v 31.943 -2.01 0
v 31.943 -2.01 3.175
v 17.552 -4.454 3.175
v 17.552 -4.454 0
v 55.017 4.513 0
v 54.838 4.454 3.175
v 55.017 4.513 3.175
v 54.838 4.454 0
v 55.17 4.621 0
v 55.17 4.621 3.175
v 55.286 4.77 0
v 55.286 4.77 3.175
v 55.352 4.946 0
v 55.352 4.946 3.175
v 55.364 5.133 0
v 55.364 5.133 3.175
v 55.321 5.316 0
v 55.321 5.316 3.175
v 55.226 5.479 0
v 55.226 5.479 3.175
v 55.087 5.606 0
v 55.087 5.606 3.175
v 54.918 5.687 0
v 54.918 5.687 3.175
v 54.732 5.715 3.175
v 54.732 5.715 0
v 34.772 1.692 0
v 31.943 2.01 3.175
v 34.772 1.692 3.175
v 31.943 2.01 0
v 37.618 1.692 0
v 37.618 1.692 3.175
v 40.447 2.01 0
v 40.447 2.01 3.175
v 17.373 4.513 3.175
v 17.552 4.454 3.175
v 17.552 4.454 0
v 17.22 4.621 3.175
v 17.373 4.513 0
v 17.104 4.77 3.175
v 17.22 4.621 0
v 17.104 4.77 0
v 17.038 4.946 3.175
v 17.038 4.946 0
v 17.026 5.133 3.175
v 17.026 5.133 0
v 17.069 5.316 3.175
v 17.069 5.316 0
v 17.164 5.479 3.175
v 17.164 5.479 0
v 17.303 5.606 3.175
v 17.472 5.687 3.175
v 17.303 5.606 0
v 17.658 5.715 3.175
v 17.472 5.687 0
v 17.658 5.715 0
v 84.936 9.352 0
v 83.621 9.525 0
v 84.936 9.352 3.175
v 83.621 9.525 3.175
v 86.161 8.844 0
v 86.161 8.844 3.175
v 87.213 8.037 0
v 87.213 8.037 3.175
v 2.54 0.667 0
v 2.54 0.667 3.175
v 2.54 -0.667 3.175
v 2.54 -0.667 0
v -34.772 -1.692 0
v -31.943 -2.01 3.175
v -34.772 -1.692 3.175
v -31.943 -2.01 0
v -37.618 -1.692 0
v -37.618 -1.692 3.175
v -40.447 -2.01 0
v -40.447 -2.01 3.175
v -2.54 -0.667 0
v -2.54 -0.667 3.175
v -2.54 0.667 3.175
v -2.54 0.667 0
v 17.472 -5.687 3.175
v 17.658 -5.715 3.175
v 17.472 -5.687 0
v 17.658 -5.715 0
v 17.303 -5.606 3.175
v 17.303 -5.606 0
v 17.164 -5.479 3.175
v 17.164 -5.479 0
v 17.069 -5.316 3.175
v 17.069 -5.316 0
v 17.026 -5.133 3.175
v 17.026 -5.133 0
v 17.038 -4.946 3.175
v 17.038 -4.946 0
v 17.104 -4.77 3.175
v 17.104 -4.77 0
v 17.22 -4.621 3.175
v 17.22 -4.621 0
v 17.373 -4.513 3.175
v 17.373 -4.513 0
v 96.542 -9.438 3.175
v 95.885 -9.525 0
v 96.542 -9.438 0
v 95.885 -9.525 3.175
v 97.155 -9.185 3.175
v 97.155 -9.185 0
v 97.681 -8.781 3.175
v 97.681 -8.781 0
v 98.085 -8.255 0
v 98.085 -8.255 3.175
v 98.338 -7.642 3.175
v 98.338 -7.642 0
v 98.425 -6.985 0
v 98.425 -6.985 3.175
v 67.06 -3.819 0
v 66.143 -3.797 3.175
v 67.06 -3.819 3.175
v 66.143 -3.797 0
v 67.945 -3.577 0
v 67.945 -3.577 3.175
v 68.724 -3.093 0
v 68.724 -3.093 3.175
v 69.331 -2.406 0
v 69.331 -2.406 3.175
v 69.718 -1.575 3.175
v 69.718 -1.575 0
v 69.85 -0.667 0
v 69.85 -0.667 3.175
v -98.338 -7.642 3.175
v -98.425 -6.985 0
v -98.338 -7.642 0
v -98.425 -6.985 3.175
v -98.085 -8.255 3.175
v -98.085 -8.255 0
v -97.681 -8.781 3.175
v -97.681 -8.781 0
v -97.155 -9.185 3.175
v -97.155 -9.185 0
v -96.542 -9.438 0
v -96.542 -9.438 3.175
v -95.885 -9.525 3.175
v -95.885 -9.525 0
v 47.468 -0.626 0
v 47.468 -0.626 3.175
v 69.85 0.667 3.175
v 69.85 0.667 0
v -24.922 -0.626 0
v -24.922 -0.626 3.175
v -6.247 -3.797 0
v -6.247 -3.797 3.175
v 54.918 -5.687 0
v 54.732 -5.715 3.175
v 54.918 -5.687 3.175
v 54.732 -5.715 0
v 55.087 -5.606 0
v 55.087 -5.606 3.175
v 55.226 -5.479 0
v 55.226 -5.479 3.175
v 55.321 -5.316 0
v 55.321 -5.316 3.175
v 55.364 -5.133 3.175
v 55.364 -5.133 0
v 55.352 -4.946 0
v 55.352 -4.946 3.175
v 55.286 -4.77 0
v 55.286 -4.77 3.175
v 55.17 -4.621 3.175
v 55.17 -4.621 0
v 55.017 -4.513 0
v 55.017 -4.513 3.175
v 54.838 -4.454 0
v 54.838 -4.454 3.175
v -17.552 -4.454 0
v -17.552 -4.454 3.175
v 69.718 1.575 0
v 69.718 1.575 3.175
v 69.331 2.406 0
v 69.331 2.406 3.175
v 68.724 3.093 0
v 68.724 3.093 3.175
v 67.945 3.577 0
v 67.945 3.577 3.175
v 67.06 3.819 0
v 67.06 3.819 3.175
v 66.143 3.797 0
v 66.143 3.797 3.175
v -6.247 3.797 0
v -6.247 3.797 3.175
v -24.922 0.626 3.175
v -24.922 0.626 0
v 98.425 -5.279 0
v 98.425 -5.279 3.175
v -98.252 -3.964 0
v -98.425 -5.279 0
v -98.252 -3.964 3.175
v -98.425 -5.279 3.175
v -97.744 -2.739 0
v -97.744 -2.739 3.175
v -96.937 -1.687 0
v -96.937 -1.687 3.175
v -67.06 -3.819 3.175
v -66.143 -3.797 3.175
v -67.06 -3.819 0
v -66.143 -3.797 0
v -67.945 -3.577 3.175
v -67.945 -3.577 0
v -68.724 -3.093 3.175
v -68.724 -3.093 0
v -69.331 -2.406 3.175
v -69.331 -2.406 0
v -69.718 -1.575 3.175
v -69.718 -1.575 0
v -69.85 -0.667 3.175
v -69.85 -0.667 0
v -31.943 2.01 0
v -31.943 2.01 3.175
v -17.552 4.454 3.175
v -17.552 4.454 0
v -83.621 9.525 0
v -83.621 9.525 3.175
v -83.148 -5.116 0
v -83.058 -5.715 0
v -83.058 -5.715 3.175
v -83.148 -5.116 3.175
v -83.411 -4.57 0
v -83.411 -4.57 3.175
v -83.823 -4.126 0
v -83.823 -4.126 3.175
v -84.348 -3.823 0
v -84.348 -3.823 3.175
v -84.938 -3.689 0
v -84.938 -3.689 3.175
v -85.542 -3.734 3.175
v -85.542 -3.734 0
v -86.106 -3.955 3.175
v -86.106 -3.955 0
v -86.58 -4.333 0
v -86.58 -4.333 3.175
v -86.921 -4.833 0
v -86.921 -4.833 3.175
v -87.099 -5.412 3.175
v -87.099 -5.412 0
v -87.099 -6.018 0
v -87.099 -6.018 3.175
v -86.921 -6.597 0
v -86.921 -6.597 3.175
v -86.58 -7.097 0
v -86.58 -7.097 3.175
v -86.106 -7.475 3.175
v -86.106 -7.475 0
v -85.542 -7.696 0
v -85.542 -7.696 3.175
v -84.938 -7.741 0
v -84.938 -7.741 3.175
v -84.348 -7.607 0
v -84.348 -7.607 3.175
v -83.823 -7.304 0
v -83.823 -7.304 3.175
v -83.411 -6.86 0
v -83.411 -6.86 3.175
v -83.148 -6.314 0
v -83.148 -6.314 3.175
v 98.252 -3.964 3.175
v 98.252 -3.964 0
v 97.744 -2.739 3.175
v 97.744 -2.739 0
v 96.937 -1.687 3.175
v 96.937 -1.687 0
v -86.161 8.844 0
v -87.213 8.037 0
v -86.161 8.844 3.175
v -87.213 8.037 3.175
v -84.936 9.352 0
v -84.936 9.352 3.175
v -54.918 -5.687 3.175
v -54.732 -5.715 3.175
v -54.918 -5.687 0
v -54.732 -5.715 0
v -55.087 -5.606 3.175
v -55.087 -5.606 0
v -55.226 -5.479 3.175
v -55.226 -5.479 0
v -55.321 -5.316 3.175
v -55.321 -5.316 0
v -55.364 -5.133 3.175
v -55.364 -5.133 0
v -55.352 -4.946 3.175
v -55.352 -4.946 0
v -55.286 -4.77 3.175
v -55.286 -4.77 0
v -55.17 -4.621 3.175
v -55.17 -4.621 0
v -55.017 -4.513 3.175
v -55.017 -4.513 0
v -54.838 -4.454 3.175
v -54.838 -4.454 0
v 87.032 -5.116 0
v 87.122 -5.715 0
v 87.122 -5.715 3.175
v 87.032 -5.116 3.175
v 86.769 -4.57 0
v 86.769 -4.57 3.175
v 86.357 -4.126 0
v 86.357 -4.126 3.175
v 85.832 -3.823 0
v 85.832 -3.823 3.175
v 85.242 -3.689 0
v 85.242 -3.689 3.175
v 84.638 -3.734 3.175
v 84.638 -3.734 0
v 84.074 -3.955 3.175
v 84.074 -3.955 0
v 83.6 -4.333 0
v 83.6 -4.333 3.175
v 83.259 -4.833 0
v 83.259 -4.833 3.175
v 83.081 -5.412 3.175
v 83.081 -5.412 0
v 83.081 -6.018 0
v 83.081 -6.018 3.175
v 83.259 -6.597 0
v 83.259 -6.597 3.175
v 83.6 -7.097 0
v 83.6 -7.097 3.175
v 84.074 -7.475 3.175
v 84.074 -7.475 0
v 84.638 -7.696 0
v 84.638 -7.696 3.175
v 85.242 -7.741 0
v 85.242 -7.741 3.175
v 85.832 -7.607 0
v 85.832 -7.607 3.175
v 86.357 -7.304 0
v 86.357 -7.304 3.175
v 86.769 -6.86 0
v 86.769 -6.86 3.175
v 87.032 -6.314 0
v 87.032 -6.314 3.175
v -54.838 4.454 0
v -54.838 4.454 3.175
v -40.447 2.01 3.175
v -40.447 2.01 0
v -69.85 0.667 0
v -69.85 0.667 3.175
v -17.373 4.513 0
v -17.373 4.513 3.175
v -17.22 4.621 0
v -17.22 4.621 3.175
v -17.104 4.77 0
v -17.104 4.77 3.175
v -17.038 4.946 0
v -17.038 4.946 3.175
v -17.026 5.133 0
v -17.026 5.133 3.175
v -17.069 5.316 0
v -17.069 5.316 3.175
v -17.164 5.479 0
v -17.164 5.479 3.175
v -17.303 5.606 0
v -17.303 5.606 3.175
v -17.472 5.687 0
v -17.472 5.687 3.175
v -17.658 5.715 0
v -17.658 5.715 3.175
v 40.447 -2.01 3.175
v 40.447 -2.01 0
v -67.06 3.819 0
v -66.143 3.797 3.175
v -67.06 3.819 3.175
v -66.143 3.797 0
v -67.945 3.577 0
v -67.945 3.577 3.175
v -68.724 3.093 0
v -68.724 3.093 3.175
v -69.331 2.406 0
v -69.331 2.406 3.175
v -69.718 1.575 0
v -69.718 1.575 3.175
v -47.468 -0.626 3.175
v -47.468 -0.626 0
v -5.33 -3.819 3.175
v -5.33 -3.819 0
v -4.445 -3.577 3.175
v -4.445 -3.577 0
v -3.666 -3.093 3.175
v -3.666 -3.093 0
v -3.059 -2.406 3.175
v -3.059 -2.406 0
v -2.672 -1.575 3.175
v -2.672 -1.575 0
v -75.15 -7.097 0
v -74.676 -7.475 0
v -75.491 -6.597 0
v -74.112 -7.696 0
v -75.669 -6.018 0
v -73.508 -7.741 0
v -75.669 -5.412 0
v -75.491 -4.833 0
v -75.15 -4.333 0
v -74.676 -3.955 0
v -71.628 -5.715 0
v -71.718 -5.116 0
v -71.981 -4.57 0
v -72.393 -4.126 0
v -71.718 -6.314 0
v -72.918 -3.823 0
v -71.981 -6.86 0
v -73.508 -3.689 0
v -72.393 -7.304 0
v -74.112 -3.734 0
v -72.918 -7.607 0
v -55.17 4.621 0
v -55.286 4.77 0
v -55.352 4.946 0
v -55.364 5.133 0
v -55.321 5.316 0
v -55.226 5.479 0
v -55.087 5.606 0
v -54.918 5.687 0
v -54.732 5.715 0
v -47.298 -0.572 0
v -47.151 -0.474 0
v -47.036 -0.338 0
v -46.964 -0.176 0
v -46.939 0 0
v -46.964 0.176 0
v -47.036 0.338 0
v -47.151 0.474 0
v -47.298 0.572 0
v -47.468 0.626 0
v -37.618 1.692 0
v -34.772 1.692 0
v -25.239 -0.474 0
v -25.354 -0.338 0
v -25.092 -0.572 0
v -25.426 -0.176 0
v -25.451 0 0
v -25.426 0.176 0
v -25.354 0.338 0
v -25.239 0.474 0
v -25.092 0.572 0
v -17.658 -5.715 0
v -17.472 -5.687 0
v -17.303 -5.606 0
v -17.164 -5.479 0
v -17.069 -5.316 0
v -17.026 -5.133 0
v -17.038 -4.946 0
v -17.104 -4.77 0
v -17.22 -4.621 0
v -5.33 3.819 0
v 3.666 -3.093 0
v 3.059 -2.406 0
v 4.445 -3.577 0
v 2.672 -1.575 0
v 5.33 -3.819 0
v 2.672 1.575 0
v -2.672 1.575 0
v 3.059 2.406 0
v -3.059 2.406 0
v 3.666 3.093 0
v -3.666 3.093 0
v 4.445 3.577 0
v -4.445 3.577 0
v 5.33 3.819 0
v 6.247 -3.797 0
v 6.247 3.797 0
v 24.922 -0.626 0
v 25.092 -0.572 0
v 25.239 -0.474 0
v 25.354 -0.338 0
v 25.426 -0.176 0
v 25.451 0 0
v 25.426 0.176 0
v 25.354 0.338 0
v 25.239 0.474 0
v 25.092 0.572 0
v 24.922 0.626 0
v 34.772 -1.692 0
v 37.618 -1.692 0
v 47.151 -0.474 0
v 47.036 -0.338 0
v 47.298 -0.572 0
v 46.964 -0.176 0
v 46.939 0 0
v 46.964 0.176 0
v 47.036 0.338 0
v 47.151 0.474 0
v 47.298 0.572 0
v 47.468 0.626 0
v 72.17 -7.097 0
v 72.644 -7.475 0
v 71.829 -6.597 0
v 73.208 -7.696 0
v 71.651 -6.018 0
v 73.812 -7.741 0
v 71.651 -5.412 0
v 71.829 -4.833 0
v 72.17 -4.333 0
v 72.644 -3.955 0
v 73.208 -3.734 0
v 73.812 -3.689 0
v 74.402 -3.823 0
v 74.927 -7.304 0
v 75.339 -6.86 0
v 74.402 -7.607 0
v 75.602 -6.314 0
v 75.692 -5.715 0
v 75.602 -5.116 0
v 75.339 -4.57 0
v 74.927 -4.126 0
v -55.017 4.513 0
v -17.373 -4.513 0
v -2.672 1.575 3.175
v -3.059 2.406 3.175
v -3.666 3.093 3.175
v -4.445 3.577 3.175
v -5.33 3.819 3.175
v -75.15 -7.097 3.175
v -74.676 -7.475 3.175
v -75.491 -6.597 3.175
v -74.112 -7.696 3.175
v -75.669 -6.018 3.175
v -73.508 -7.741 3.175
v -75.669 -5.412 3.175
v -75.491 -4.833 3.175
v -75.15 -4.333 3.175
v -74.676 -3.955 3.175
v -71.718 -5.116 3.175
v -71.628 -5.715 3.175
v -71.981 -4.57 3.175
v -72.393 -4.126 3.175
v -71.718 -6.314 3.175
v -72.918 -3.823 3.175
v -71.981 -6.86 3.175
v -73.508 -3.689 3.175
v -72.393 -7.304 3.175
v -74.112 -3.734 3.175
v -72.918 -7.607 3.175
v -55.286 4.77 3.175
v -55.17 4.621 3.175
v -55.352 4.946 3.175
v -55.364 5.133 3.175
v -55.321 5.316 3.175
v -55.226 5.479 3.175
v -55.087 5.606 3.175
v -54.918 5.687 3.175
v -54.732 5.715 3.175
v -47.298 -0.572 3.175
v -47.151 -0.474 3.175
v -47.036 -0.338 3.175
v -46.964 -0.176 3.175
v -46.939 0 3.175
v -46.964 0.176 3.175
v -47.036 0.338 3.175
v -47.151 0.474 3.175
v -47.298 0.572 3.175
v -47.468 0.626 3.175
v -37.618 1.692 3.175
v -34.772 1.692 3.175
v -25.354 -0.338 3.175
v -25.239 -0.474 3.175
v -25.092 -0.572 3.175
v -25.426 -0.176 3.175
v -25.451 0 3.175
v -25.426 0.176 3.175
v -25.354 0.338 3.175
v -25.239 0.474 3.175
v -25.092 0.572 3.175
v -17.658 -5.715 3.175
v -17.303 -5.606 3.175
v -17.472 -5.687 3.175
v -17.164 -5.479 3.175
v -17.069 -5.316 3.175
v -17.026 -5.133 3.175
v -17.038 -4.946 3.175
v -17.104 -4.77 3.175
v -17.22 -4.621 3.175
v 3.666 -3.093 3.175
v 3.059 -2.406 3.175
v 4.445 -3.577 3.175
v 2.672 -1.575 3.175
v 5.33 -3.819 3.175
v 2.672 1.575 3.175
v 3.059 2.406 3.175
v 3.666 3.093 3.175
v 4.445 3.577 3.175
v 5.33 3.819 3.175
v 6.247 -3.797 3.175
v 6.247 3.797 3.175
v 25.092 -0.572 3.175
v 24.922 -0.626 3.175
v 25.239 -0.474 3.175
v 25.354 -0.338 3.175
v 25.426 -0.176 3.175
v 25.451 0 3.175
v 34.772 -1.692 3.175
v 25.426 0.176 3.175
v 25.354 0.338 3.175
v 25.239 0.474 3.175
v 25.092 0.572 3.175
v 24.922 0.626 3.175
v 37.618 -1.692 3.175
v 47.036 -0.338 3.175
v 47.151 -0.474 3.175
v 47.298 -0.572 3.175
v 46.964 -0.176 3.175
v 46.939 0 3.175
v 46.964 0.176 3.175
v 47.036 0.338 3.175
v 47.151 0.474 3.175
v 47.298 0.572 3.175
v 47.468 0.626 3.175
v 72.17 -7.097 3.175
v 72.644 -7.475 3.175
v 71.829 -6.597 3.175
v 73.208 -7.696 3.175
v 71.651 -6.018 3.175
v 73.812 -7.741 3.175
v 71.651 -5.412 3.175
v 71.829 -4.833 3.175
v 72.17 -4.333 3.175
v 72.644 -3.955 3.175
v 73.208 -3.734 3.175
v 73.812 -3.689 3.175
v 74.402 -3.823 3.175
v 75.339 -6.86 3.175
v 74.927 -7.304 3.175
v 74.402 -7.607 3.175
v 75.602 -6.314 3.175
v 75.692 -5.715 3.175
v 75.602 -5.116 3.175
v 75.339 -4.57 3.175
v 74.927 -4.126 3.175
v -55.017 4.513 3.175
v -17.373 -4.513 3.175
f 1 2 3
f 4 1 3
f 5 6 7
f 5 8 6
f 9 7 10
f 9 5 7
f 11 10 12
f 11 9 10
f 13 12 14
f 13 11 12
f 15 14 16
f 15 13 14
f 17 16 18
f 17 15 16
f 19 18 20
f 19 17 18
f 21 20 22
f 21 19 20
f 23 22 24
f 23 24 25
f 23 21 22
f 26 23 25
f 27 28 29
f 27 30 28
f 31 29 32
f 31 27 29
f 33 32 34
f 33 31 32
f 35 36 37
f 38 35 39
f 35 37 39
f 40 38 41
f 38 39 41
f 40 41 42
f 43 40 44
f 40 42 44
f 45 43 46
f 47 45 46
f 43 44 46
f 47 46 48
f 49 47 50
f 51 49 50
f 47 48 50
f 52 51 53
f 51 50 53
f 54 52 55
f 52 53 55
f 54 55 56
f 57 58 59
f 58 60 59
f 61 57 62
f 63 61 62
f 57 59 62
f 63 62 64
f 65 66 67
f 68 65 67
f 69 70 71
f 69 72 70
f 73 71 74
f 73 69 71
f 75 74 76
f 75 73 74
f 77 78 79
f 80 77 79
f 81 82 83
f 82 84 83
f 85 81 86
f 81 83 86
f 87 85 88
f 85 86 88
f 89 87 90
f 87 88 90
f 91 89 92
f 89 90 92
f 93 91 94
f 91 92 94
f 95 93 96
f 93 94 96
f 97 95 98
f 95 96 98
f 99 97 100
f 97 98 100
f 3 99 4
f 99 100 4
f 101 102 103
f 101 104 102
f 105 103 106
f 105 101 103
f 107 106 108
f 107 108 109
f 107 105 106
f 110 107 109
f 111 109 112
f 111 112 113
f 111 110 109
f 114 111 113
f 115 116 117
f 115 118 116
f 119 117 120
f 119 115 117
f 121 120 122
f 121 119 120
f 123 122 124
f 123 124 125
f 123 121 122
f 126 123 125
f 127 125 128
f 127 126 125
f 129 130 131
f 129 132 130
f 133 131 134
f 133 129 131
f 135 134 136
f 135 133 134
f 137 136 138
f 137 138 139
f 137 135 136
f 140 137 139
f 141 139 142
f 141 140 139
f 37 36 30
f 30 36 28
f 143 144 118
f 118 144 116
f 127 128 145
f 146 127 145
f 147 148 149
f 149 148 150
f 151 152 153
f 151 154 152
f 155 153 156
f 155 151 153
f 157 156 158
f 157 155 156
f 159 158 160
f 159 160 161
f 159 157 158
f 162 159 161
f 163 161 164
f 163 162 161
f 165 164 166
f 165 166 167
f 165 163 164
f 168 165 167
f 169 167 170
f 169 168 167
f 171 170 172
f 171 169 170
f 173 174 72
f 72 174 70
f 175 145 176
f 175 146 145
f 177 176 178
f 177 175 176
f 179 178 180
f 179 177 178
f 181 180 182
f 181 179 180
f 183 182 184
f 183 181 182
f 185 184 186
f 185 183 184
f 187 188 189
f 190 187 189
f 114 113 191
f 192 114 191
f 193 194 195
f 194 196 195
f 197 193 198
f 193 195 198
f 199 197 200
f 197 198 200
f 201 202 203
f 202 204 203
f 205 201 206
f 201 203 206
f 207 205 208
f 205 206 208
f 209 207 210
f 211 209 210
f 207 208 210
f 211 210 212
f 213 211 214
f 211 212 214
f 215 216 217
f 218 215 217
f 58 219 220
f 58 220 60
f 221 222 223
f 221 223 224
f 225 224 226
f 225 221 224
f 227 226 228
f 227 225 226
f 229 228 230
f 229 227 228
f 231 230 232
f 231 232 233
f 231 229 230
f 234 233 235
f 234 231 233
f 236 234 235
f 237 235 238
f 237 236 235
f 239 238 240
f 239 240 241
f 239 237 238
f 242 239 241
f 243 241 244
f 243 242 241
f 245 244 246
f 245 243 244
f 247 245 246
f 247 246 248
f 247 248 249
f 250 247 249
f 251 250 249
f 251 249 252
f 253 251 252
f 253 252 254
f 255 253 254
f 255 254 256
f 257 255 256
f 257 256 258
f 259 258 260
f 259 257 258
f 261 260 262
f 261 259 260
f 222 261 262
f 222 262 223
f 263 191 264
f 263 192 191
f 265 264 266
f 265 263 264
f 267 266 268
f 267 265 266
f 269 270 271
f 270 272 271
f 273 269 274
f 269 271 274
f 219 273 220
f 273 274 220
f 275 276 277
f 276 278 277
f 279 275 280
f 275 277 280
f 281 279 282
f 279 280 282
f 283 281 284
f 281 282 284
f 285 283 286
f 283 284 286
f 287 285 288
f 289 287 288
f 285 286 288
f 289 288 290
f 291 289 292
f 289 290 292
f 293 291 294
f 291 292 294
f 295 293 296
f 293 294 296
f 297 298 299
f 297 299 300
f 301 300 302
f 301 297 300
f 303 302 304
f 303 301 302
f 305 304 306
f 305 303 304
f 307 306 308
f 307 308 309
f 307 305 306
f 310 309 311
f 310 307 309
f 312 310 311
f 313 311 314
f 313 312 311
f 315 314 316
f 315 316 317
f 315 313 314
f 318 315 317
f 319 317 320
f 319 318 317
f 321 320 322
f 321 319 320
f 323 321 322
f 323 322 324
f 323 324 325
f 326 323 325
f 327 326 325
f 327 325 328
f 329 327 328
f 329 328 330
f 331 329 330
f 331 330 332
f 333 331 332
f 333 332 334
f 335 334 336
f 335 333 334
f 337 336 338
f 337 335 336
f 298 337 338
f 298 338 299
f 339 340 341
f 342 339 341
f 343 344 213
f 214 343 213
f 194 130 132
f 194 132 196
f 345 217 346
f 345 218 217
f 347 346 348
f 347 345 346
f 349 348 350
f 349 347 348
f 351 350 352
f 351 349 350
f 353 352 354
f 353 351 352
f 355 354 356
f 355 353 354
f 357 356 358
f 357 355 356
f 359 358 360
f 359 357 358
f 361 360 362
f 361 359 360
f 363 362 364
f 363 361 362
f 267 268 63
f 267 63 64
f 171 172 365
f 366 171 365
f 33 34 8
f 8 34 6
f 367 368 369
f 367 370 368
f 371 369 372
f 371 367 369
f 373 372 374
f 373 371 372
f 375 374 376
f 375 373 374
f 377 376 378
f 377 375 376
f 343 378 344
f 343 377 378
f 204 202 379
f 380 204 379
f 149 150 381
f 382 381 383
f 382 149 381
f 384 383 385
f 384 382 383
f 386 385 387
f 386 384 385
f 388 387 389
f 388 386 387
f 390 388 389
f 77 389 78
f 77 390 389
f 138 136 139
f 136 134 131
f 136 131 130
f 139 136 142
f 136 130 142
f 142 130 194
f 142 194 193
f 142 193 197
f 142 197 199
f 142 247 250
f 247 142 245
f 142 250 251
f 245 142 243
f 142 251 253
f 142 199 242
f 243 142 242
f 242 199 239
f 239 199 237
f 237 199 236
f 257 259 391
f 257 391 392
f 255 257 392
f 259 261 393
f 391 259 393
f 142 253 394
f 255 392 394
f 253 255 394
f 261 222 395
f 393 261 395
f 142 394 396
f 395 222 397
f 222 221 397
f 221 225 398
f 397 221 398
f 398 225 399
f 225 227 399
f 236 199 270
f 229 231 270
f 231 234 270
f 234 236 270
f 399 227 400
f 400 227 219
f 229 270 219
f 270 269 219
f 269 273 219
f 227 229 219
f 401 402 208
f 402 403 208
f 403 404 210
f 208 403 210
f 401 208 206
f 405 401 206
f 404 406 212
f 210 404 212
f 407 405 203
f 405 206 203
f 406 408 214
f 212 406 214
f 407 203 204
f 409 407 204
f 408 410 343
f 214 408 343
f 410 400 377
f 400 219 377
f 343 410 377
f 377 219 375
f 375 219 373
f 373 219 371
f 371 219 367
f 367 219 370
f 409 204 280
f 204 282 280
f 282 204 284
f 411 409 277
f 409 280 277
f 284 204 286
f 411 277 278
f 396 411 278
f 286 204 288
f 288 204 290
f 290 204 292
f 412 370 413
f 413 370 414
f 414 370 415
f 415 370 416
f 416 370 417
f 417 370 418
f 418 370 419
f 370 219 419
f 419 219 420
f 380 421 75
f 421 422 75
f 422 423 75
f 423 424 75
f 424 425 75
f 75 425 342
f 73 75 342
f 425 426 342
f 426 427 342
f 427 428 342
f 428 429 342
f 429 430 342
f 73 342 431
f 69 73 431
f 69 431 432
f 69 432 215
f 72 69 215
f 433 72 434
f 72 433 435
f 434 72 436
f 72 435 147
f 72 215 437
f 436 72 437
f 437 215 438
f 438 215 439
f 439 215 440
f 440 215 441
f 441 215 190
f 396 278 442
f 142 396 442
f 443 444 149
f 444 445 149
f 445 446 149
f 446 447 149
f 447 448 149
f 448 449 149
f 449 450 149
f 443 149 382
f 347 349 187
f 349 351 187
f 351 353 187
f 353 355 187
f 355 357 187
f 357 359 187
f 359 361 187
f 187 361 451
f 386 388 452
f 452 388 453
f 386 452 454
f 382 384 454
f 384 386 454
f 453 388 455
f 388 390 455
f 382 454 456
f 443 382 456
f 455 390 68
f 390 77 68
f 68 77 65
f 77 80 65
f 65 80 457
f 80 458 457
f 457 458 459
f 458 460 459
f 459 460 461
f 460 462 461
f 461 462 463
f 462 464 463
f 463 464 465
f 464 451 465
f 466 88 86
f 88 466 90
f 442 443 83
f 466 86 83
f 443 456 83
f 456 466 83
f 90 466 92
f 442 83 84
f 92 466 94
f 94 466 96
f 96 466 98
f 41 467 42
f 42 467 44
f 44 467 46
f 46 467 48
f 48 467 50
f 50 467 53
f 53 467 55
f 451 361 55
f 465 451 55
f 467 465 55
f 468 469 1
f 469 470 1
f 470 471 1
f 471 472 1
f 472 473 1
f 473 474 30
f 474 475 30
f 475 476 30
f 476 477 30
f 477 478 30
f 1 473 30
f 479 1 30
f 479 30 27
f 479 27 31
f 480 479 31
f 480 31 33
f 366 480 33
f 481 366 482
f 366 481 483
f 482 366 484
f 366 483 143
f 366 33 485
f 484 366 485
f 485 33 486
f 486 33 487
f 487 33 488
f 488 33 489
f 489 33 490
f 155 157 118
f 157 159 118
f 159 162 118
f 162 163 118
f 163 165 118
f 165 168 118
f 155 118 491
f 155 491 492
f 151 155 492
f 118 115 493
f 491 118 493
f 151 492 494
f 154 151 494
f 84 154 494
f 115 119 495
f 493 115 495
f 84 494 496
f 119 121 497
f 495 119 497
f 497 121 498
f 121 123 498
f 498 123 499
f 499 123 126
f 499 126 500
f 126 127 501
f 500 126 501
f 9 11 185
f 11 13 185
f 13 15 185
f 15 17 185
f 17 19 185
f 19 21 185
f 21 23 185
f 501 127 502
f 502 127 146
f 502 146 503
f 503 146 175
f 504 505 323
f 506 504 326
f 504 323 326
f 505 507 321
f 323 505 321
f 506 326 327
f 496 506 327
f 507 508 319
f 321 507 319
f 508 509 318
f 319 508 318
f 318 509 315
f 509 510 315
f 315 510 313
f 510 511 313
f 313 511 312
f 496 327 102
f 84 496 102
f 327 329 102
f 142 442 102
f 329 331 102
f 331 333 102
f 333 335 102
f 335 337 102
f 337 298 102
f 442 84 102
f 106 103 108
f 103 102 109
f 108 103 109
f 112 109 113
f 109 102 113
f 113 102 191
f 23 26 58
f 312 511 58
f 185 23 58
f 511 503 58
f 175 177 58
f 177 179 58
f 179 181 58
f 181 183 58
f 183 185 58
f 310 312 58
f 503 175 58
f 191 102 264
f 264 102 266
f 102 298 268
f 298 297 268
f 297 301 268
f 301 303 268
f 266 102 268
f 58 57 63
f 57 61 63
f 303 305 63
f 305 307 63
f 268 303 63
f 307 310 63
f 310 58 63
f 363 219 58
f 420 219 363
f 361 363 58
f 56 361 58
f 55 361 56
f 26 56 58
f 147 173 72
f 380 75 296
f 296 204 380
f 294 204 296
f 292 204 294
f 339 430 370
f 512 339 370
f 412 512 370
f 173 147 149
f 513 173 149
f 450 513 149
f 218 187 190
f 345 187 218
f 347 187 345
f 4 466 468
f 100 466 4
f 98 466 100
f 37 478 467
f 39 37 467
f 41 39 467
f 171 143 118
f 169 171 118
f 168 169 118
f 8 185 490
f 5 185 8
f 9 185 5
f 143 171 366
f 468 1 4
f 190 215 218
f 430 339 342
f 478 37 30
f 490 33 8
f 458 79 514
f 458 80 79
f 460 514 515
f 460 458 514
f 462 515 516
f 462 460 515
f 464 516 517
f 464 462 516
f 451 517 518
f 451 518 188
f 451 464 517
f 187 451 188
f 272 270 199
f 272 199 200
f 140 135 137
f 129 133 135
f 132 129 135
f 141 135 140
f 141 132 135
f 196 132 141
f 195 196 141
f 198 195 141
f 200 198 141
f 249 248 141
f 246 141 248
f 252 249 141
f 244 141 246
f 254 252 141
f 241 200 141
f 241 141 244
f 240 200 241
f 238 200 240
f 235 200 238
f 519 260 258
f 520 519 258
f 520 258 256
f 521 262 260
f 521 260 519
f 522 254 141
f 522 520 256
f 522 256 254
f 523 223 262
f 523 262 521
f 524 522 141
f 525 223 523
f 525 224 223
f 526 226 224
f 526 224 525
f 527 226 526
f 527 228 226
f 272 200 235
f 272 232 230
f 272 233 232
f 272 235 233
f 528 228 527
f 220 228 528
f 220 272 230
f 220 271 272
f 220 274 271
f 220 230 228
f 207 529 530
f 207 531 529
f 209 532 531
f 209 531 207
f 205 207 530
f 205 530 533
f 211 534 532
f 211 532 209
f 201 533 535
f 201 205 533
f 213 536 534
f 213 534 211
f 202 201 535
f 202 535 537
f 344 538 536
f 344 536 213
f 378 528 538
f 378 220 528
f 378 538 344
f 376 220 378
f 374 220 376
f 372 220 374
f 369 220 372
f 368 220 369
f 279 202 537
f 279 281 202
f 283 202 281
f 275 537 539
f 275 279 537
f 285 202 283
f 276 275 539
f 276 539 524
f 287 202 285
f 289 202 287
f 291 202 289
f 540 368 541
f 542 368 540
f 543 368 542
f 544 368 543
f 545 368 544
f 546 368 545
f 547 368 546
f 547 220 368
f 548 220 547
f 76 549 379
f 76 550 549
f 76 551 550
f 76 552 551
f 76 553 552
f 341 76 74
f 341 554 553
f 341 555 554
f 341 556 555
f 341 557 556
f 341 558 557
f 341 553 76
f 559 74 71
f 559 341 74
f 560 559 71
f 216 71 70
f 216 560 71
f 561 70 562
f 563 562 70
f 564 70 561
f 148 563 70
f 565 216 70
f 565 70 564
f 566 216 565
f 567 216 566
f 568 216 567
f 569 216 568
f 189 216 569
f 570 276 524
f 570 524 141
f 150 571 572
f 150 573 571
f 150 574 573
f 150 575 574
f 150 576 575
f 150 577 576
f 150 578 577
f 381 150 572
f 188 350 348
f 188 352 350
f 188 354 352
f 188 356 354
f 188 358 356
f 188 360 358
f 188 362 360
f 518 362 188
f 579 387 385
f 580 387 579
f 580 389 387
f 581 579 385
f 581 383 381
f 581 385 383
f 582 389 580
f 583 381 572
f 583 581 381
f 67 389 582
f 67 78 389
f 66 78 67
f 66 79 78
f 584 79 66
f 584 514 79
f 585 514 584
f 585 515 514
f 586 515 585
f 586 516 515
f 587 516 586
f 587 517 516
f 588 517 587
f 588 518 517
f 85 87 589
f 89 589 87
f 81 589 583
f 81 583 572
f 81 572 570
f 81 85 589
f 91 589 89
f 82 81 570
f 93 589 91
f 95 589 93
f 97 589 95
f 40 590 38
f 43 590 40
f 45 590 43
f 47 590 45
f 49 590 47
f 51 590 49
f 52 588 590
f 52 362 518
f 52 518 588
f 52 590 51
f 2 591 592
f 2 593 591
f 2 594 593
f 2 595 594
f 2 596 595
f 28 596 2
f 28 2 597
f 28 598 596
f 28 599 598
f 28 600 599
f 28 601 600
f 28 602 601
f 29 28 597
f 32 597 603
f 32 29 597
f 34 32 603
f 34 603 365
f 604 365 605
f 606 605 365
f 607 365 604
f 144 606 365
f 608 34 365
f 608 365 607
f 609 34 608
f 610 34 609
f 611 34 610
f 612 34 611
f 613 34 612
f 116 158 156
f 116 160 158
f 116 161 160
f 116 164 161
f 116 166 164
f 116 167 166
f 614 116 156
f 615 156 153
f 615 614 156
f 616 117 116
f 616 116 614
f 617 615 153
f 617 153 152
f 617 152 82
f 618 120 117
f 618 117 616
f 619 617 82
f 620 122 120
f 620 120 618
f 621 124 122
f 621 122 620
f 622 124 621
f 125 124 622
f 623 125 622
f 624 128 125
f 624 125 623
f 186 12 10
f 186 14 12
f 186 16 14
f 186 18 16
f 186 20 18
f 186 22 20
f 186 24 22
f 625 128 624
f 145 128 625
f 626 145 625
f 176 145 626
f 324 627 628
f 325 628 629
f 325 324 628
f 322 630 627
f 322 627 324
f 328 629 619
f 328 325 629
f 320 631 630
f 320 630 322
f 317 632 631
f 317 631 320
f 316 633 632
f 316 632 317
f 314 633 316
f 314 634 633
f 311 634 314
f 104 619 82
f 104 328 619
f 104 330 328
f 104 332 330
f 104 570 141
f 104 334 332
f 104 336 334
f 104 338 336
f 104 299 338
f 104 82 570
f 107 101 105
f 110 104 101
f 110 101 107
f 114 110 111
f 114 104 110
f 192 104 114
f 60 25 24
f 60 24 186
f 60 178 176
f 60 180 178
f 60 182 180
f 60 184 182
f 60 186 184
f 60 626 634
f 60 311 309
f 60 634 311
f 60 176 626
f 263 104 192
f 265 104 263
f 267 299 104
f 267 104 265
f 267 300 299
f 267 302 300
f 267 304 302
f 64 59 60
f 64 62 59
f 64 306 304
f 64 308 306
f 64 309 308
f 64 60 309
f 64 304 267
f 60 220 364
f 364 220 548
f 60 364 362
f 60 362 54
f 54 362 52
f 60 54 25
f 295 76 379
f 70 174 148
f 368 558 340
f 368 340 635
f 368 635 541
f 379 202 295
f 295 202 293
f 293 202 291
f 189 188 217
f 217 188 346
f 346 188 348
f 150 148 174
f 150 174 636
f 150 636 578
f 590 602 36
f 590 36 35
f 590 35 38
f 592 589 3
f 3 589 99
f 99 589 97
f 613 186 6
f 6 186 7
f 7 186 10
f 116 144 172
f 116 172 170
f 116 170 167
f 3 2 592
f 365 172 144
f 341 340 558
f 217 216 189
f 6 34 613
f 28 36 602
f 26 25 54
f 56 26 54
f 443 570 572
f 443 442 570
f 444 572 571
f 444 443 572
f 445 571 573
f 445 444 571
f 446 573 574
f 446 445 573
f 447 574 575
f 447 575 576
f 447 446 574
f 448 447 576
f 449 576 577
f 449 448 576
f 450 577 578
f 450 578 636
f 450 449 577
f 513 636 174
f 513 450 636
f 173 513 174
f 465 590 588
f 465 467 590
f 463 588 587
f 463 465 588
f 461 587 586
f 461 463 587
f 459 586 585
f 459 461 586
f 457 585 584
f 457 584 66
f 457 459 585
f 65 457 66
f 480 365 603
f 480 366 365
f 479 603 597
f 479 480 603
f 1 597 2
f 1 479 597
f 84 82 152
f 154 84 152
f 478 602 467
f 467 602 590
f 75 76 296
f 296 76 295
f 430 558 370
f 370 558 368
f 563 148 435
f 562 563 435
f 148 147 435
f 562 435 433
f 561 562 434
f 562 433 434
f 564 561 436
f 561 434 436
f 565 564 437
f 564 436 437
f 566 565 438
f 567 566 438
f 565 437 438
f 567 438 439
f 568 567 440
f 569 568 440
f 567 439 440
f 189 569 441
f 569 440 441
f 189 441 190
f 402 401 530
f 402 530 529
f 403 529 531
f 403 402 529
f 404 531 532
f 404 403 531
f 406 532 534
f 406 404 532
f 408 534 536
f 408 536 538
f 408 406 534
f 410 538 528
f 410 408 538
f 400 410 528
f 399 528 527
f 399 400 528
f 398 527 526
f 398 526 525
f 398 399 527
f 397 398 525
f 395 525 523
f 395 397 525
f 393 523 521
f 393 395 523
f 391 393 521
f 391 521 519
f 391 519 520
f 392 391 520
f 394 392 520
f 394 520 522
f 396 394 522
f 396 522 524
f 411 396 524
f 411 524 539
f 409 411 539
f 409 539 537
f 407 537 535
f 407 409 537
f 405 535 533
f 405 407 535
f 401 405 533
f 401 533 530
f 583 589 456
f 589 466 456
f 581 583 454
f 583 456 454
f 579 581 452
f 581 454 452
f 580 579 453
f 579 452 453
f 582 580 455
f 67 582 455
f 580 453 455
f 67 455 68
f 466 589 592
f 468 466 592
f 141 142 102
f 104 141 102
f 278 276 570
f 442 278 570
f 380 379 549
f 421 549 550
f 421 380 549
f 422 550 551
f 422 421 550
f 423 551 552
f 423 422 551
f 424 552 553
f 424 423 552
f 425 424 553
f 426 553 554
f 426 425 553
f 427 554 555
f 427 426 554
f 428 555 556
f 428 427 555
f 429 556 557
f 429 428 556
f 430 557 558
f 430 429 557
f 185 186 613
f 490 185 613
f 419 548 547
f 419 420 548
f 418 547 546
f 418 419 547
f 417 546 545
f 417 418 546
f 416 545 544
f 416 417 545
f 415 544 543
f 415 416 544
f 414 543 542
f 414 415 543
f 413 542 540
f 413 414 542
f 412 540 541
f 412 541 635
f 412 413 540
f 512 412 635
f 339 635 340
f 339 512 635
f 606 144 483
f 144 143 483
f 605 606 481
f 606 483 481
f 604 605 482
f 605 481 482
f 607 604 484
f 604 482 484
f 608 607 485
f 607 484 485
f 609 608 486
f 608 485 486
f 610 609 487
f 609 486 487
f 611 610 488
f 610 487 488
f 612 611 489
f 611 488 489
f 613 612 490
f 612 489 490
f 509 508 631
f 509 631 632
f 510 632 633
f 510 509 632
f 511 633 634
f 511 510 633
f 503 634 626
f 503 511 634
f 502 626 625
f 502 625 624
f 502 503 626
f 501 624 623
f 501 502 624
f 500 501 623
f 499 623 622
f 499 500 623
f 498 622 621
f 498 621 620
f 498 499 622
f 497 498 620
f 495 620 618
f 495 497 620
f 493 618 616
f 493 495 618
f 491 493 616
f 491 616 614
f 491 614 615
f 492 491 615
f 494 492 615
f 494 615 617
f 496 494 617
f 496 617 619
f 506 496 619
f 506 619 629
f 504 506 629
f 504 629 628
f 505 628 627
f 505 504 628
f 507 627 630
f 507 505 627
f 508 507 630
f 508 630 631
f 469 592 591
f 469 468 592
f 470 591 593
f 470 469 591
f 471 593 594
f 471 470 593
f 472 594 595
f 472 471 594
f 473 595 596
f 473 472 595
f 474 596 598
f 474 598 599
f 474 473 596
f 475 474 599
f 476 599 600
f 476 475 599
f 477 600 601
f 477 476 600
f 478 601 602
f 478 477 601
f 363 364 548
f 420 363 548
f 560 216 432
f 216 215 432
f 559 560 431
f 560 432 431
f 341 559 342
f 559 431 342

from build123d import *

# Parameters (mm, degrees)
SKETCH1_W           = 196.85
SKETCH1_H           = 19.05
SKETCH1_R           = 2.032
BOSS_EXTRUDE1_DEPTH = 3.175
CHAMFER1_SIZE       = 12.7
FILLET1_R           = 5.08
FILLET2_R           = 2.54
CUT_EXTRUDE1_REACH  = 100.936
FILLET3_R           = 3.175
FILLET4_R           = 0.635
FILLET5_R           = 25.4


with BuildPart() as part:
    # Sketch1 → Boss-Extrude1 (new body)
    with BuildSketch(Plane.XY):
        Rectangle(SKETCH1_W, SKETCH1_H)
        with Locations((-73.66, -5.715)):
            Circle(SKETCH1_R, mode=Mode.SUBTRACT)
        with Locations((-85.09, -5.715)):
            Circle(SKETCH1_R, mode=Mode.SUBTRACT)
        with Locations((73.66, -5.715)):
            Circle(SKETCH1_R, mode=Mode.SUBTRACT)
        with Locations((85.09, -5.715)):
            Circle(SKETCH1_R, mode=Mode.SUBTRACT)
    extrude(amount=BOSS_EXTRUDE1_DEPTH)

    # Chamfer1
    chamfer1_edges = [part.edges().sort_by_distance(p)[0] for p in [
        (-98.425, 9.525, 1.5875),
        (98.425, 9.525, 1.5875),
    ]]
    chamfer(chamfer1_edges, length=CHAMFER1_SIZE)

    # Fillet1
    fillet1_edges = [part.edges().sort_by_distance(p)[0] for p in [
        (-85.725, 9.525, 1.5875),
        (85.725, 9.525, 1.5875),
        (98.425, -3.175, 1.5875),
        (-98.425, -3.175, 1.5875),
    ]]
    fillet(fillet1_edges, radius=FILLET1_R)

    # Fillet2
    fillet2_edges = [part.edges().sort_by_distance(p)[0] for p in [
        (98.425, -9.525, 1.5875),
        (-98.425, -9.525, 1.5875),
    ]]
    fillet(fillet2_edges, radius=FILLET2_R)

    # Sketch2 → Cut-Extrude1 (cut, up to next)
    with BuildSketch(Plane.XY.offset(3.175), mode=Mode.PRIVATE) as cut_extrude1_sk1:
        Polygon((-62.264047257, 5.715), (-36.195, 1.288180654), (-10.125952743, 5.715), align=None)
    cut_extrude1_tool1 = extrude(cut_extrude1_sk1.sketch, amount=-CUT_EXTRUDE1_REACH, mode=Mode.PRIVATE) & part.part
    # Sketch2 → Cut-Extrude1 (cut, up to next)
    with BuildSketch(Plane.XY.offset(3.175), mode=Mode.PRIVATE) as cut_extrude1_sk2:
        Polygon((-69.85, 4.426819346), (-69.85, -4.426819346), (-43.780952743, 0), align=None)
    cut_extrude1_tool2 = extrude(cut_extrude1_sk2.sketch, amount=-CUT_EXTRUDE1_REACH, mode=Mode.PRIVATE) & part.part
    # Sketch2 → Cut-Extrude1 (cut, up to next)
    with BuildSketch(Plane.XY.offset(3.175), mode=Mode.PRIVATE) as cut_extrude1_sk3:
        Polygon((-36.195, -1.288180654), (-62.264047257, -5.715), (-10.125952743, -5.715), align=None)
    cut_extrude1_tool3 = extrude(cut_extrude1_sk3.sketch, amount=-CUT_EXTRUDE1_REACH, mode=Mode.PRIVATE) & part.part
    # Sketch2 → Cut-Extrude1 (cut, up to next)
    with BuildSketch(Plane.XY.offset(3.175), mode=Mode.PRIVATE) as cut_extrude1_sk4:
        Polygon((-2.54, 4.426819346), (-28.609047257, 0), (-2.54, -4.426819346), align=None)
    cut_extrude1_tool4 = extrude(cut_extrude1_sk4.sketch, amount=-CUT_EXTRUDE1_REACH, mode=Mode.PRIVATE) & part.part
    # Sketch2 → Cut-Extrude1 (cut, up to next)
    with BuildSketch(Plane.XY.offset(3.175), mode=Mode.PRIVATE) as cut_extrude1_sk5:
        Polygon((2.54, 4.426819346), (2.54, -4.426819346), (28.609047257, 0), align=None)
    cut_extrude1_tool5 = extrude(cut_extrude1_sk5.sketch, amount=-CUT_EXTRUDE1_REACH, mode=Mode.PRIVATE) & part.part
    # Sketch2 → Cut-Extrude1 (cut, up to next)
    with BuildSketch(Plane.XY.offset(3.175), mode=Mode.PRIVATE) as cut_extrude1_sk6:
        Polygon((62.264047257, 5.715), (10.125952743, 5.715), (36.195, 1.288180654), align=None)
    cut_extrude1_tool6 = extrude(cut_extrude1_sk6.sketch, amount=-CUT_EXTRUDE1_REACH, mode=Mode.PRIVATE) & part.part
    # Sketch2 → Cut-Extrude1 (cut, up to next)
    with BuildSketch(Plane.XY.offset(3.175), mode=Mode.PRIVATE) as cut_extrude1_sk7:
        Polygon((69.85, 4.426819346), (43.780952743, 0), (69.85, -4.426819346), align=None)
    cut_extrude1_tool7 = extrude(cut_extrude1_sk7.sketch, amount=-CUT_EXTRUDE1_REACH, mode=Mode.PRIVATE) & part.part
    # Sketch2 → Cut-Extrude1 (cut, up to next)
    with BuildSketch(Plane.XY.offset(3.175), mode=Mode.PRIVATE) as cut_extrude1_sk8:
        Polygon((36.195, -1.288180654), (10.125952743, -5.715), (62.264047257, -5.715), align=None)
    cut_extrude1_tool8 = extrude(cut_extrude1_sk8.sketch, amount=-CUT_EXTRUDE1_REACH, mode=Mode.PRIVATE) & part.part
    add(cut_extrude1_tool1.solids().sort_by_distance((-36.195, 4.239394, 3.175))[0], mode=Mode.SUBTRACT)
    add(cut_extrude1_tool2.solids().sort_by_distance((-61.160318, 0, 3.175))[0], mode=Mode.SUBTRACT)
    add(cut_extrude1_tool3.solids().sort_by_distance((-36.195, -4.239394, 3.175))[0], mode=Mode.SUBTRACT)
    add(cut_extrude1_tool4.solids().sort_by_distance((-11.229682, 0, 3.175))[0], mode=Mode.SUBTRACT)
    add(cut_extrude1_tool5.solids().sort_by_distance((11.229682, 0, 3.175))[0], mode=Mode.SUBTRACT)
    add(cut_extrude1_tool6.solids().sort_by_distance((36.195, 4.239394, 3.175))[0], mode=Mode.SUBTRACT)
    add(cut_extrude1_tool7.solids().sort_by_distance((61.160318, 0, 3.175))[0], mode=Mode.SUBTRACT)
    add(cut_extrude1_tool8.solids().sort_by_distance((36.195, -4.239394, 3.175))[0], mode=Mode.SUBTRACT)

    # Fillet3
    fillet3_edges = [part.edges().sort_by_distance(p)[0] for p in [
        (2.54, -4.426819346, 1.5875),
        (2.54, 4.426819346, 1.5875),
        (-2.54, 4.426819346, 1.5875),
        (-2.54, -4.426819346, 1.5875),
        (-69.85, -4.426819346, 1.5875),
        (-69.85, 4.426819346, 1.5875),
        (69.85, 4.426819346, 1.5875),
        (69.85, -4.426819346, 1.5875),
    ]]
    fillet(fillet3_edges, radius=FILLET3_R)

    # Fillet4
    fillet4_edges = [part.edges().sort_by_distance(p)[0] for p in [
        (28.609047257, 0, 1.5875),
        (-28.609047257, 0, 1.5875),
        (-43.780952743, 0, 1.5875),
        (-62.264047257, -5.715, 1.5875),
        (-10.125952743, -5.715, 1.5875),
        (62.264047257, -5.715, 1.5875),
        (10.125952743, -5.715, 1.5875),
        (10.125952743, 5.715, 1.5875),
        (62.264047257, 5.715, 1.5875),
        (43.780952743, 0, 1.5875),
        (-62.264047257, 5.715, 1.5875),
        (-10.125952743, 5.715, 1.5875),
    ]]
    fillet(fillet4_edges, radius=FILLET4_R)

    # Fillet5
    fillet5_edges = [part.edges().sort_by_distance(p)[0] for p in [
        (-36.195, -1.288180654, 1.5875),
        (36.195, -1.288180654, 1.5875),
        (36.195, 1.288180654, 1.5875),
        (-36.195, 1.288180654, 1.5875),
    ]]
    fillet(fillet5_edges, radius=FILLET5_R)


solid = part.part
